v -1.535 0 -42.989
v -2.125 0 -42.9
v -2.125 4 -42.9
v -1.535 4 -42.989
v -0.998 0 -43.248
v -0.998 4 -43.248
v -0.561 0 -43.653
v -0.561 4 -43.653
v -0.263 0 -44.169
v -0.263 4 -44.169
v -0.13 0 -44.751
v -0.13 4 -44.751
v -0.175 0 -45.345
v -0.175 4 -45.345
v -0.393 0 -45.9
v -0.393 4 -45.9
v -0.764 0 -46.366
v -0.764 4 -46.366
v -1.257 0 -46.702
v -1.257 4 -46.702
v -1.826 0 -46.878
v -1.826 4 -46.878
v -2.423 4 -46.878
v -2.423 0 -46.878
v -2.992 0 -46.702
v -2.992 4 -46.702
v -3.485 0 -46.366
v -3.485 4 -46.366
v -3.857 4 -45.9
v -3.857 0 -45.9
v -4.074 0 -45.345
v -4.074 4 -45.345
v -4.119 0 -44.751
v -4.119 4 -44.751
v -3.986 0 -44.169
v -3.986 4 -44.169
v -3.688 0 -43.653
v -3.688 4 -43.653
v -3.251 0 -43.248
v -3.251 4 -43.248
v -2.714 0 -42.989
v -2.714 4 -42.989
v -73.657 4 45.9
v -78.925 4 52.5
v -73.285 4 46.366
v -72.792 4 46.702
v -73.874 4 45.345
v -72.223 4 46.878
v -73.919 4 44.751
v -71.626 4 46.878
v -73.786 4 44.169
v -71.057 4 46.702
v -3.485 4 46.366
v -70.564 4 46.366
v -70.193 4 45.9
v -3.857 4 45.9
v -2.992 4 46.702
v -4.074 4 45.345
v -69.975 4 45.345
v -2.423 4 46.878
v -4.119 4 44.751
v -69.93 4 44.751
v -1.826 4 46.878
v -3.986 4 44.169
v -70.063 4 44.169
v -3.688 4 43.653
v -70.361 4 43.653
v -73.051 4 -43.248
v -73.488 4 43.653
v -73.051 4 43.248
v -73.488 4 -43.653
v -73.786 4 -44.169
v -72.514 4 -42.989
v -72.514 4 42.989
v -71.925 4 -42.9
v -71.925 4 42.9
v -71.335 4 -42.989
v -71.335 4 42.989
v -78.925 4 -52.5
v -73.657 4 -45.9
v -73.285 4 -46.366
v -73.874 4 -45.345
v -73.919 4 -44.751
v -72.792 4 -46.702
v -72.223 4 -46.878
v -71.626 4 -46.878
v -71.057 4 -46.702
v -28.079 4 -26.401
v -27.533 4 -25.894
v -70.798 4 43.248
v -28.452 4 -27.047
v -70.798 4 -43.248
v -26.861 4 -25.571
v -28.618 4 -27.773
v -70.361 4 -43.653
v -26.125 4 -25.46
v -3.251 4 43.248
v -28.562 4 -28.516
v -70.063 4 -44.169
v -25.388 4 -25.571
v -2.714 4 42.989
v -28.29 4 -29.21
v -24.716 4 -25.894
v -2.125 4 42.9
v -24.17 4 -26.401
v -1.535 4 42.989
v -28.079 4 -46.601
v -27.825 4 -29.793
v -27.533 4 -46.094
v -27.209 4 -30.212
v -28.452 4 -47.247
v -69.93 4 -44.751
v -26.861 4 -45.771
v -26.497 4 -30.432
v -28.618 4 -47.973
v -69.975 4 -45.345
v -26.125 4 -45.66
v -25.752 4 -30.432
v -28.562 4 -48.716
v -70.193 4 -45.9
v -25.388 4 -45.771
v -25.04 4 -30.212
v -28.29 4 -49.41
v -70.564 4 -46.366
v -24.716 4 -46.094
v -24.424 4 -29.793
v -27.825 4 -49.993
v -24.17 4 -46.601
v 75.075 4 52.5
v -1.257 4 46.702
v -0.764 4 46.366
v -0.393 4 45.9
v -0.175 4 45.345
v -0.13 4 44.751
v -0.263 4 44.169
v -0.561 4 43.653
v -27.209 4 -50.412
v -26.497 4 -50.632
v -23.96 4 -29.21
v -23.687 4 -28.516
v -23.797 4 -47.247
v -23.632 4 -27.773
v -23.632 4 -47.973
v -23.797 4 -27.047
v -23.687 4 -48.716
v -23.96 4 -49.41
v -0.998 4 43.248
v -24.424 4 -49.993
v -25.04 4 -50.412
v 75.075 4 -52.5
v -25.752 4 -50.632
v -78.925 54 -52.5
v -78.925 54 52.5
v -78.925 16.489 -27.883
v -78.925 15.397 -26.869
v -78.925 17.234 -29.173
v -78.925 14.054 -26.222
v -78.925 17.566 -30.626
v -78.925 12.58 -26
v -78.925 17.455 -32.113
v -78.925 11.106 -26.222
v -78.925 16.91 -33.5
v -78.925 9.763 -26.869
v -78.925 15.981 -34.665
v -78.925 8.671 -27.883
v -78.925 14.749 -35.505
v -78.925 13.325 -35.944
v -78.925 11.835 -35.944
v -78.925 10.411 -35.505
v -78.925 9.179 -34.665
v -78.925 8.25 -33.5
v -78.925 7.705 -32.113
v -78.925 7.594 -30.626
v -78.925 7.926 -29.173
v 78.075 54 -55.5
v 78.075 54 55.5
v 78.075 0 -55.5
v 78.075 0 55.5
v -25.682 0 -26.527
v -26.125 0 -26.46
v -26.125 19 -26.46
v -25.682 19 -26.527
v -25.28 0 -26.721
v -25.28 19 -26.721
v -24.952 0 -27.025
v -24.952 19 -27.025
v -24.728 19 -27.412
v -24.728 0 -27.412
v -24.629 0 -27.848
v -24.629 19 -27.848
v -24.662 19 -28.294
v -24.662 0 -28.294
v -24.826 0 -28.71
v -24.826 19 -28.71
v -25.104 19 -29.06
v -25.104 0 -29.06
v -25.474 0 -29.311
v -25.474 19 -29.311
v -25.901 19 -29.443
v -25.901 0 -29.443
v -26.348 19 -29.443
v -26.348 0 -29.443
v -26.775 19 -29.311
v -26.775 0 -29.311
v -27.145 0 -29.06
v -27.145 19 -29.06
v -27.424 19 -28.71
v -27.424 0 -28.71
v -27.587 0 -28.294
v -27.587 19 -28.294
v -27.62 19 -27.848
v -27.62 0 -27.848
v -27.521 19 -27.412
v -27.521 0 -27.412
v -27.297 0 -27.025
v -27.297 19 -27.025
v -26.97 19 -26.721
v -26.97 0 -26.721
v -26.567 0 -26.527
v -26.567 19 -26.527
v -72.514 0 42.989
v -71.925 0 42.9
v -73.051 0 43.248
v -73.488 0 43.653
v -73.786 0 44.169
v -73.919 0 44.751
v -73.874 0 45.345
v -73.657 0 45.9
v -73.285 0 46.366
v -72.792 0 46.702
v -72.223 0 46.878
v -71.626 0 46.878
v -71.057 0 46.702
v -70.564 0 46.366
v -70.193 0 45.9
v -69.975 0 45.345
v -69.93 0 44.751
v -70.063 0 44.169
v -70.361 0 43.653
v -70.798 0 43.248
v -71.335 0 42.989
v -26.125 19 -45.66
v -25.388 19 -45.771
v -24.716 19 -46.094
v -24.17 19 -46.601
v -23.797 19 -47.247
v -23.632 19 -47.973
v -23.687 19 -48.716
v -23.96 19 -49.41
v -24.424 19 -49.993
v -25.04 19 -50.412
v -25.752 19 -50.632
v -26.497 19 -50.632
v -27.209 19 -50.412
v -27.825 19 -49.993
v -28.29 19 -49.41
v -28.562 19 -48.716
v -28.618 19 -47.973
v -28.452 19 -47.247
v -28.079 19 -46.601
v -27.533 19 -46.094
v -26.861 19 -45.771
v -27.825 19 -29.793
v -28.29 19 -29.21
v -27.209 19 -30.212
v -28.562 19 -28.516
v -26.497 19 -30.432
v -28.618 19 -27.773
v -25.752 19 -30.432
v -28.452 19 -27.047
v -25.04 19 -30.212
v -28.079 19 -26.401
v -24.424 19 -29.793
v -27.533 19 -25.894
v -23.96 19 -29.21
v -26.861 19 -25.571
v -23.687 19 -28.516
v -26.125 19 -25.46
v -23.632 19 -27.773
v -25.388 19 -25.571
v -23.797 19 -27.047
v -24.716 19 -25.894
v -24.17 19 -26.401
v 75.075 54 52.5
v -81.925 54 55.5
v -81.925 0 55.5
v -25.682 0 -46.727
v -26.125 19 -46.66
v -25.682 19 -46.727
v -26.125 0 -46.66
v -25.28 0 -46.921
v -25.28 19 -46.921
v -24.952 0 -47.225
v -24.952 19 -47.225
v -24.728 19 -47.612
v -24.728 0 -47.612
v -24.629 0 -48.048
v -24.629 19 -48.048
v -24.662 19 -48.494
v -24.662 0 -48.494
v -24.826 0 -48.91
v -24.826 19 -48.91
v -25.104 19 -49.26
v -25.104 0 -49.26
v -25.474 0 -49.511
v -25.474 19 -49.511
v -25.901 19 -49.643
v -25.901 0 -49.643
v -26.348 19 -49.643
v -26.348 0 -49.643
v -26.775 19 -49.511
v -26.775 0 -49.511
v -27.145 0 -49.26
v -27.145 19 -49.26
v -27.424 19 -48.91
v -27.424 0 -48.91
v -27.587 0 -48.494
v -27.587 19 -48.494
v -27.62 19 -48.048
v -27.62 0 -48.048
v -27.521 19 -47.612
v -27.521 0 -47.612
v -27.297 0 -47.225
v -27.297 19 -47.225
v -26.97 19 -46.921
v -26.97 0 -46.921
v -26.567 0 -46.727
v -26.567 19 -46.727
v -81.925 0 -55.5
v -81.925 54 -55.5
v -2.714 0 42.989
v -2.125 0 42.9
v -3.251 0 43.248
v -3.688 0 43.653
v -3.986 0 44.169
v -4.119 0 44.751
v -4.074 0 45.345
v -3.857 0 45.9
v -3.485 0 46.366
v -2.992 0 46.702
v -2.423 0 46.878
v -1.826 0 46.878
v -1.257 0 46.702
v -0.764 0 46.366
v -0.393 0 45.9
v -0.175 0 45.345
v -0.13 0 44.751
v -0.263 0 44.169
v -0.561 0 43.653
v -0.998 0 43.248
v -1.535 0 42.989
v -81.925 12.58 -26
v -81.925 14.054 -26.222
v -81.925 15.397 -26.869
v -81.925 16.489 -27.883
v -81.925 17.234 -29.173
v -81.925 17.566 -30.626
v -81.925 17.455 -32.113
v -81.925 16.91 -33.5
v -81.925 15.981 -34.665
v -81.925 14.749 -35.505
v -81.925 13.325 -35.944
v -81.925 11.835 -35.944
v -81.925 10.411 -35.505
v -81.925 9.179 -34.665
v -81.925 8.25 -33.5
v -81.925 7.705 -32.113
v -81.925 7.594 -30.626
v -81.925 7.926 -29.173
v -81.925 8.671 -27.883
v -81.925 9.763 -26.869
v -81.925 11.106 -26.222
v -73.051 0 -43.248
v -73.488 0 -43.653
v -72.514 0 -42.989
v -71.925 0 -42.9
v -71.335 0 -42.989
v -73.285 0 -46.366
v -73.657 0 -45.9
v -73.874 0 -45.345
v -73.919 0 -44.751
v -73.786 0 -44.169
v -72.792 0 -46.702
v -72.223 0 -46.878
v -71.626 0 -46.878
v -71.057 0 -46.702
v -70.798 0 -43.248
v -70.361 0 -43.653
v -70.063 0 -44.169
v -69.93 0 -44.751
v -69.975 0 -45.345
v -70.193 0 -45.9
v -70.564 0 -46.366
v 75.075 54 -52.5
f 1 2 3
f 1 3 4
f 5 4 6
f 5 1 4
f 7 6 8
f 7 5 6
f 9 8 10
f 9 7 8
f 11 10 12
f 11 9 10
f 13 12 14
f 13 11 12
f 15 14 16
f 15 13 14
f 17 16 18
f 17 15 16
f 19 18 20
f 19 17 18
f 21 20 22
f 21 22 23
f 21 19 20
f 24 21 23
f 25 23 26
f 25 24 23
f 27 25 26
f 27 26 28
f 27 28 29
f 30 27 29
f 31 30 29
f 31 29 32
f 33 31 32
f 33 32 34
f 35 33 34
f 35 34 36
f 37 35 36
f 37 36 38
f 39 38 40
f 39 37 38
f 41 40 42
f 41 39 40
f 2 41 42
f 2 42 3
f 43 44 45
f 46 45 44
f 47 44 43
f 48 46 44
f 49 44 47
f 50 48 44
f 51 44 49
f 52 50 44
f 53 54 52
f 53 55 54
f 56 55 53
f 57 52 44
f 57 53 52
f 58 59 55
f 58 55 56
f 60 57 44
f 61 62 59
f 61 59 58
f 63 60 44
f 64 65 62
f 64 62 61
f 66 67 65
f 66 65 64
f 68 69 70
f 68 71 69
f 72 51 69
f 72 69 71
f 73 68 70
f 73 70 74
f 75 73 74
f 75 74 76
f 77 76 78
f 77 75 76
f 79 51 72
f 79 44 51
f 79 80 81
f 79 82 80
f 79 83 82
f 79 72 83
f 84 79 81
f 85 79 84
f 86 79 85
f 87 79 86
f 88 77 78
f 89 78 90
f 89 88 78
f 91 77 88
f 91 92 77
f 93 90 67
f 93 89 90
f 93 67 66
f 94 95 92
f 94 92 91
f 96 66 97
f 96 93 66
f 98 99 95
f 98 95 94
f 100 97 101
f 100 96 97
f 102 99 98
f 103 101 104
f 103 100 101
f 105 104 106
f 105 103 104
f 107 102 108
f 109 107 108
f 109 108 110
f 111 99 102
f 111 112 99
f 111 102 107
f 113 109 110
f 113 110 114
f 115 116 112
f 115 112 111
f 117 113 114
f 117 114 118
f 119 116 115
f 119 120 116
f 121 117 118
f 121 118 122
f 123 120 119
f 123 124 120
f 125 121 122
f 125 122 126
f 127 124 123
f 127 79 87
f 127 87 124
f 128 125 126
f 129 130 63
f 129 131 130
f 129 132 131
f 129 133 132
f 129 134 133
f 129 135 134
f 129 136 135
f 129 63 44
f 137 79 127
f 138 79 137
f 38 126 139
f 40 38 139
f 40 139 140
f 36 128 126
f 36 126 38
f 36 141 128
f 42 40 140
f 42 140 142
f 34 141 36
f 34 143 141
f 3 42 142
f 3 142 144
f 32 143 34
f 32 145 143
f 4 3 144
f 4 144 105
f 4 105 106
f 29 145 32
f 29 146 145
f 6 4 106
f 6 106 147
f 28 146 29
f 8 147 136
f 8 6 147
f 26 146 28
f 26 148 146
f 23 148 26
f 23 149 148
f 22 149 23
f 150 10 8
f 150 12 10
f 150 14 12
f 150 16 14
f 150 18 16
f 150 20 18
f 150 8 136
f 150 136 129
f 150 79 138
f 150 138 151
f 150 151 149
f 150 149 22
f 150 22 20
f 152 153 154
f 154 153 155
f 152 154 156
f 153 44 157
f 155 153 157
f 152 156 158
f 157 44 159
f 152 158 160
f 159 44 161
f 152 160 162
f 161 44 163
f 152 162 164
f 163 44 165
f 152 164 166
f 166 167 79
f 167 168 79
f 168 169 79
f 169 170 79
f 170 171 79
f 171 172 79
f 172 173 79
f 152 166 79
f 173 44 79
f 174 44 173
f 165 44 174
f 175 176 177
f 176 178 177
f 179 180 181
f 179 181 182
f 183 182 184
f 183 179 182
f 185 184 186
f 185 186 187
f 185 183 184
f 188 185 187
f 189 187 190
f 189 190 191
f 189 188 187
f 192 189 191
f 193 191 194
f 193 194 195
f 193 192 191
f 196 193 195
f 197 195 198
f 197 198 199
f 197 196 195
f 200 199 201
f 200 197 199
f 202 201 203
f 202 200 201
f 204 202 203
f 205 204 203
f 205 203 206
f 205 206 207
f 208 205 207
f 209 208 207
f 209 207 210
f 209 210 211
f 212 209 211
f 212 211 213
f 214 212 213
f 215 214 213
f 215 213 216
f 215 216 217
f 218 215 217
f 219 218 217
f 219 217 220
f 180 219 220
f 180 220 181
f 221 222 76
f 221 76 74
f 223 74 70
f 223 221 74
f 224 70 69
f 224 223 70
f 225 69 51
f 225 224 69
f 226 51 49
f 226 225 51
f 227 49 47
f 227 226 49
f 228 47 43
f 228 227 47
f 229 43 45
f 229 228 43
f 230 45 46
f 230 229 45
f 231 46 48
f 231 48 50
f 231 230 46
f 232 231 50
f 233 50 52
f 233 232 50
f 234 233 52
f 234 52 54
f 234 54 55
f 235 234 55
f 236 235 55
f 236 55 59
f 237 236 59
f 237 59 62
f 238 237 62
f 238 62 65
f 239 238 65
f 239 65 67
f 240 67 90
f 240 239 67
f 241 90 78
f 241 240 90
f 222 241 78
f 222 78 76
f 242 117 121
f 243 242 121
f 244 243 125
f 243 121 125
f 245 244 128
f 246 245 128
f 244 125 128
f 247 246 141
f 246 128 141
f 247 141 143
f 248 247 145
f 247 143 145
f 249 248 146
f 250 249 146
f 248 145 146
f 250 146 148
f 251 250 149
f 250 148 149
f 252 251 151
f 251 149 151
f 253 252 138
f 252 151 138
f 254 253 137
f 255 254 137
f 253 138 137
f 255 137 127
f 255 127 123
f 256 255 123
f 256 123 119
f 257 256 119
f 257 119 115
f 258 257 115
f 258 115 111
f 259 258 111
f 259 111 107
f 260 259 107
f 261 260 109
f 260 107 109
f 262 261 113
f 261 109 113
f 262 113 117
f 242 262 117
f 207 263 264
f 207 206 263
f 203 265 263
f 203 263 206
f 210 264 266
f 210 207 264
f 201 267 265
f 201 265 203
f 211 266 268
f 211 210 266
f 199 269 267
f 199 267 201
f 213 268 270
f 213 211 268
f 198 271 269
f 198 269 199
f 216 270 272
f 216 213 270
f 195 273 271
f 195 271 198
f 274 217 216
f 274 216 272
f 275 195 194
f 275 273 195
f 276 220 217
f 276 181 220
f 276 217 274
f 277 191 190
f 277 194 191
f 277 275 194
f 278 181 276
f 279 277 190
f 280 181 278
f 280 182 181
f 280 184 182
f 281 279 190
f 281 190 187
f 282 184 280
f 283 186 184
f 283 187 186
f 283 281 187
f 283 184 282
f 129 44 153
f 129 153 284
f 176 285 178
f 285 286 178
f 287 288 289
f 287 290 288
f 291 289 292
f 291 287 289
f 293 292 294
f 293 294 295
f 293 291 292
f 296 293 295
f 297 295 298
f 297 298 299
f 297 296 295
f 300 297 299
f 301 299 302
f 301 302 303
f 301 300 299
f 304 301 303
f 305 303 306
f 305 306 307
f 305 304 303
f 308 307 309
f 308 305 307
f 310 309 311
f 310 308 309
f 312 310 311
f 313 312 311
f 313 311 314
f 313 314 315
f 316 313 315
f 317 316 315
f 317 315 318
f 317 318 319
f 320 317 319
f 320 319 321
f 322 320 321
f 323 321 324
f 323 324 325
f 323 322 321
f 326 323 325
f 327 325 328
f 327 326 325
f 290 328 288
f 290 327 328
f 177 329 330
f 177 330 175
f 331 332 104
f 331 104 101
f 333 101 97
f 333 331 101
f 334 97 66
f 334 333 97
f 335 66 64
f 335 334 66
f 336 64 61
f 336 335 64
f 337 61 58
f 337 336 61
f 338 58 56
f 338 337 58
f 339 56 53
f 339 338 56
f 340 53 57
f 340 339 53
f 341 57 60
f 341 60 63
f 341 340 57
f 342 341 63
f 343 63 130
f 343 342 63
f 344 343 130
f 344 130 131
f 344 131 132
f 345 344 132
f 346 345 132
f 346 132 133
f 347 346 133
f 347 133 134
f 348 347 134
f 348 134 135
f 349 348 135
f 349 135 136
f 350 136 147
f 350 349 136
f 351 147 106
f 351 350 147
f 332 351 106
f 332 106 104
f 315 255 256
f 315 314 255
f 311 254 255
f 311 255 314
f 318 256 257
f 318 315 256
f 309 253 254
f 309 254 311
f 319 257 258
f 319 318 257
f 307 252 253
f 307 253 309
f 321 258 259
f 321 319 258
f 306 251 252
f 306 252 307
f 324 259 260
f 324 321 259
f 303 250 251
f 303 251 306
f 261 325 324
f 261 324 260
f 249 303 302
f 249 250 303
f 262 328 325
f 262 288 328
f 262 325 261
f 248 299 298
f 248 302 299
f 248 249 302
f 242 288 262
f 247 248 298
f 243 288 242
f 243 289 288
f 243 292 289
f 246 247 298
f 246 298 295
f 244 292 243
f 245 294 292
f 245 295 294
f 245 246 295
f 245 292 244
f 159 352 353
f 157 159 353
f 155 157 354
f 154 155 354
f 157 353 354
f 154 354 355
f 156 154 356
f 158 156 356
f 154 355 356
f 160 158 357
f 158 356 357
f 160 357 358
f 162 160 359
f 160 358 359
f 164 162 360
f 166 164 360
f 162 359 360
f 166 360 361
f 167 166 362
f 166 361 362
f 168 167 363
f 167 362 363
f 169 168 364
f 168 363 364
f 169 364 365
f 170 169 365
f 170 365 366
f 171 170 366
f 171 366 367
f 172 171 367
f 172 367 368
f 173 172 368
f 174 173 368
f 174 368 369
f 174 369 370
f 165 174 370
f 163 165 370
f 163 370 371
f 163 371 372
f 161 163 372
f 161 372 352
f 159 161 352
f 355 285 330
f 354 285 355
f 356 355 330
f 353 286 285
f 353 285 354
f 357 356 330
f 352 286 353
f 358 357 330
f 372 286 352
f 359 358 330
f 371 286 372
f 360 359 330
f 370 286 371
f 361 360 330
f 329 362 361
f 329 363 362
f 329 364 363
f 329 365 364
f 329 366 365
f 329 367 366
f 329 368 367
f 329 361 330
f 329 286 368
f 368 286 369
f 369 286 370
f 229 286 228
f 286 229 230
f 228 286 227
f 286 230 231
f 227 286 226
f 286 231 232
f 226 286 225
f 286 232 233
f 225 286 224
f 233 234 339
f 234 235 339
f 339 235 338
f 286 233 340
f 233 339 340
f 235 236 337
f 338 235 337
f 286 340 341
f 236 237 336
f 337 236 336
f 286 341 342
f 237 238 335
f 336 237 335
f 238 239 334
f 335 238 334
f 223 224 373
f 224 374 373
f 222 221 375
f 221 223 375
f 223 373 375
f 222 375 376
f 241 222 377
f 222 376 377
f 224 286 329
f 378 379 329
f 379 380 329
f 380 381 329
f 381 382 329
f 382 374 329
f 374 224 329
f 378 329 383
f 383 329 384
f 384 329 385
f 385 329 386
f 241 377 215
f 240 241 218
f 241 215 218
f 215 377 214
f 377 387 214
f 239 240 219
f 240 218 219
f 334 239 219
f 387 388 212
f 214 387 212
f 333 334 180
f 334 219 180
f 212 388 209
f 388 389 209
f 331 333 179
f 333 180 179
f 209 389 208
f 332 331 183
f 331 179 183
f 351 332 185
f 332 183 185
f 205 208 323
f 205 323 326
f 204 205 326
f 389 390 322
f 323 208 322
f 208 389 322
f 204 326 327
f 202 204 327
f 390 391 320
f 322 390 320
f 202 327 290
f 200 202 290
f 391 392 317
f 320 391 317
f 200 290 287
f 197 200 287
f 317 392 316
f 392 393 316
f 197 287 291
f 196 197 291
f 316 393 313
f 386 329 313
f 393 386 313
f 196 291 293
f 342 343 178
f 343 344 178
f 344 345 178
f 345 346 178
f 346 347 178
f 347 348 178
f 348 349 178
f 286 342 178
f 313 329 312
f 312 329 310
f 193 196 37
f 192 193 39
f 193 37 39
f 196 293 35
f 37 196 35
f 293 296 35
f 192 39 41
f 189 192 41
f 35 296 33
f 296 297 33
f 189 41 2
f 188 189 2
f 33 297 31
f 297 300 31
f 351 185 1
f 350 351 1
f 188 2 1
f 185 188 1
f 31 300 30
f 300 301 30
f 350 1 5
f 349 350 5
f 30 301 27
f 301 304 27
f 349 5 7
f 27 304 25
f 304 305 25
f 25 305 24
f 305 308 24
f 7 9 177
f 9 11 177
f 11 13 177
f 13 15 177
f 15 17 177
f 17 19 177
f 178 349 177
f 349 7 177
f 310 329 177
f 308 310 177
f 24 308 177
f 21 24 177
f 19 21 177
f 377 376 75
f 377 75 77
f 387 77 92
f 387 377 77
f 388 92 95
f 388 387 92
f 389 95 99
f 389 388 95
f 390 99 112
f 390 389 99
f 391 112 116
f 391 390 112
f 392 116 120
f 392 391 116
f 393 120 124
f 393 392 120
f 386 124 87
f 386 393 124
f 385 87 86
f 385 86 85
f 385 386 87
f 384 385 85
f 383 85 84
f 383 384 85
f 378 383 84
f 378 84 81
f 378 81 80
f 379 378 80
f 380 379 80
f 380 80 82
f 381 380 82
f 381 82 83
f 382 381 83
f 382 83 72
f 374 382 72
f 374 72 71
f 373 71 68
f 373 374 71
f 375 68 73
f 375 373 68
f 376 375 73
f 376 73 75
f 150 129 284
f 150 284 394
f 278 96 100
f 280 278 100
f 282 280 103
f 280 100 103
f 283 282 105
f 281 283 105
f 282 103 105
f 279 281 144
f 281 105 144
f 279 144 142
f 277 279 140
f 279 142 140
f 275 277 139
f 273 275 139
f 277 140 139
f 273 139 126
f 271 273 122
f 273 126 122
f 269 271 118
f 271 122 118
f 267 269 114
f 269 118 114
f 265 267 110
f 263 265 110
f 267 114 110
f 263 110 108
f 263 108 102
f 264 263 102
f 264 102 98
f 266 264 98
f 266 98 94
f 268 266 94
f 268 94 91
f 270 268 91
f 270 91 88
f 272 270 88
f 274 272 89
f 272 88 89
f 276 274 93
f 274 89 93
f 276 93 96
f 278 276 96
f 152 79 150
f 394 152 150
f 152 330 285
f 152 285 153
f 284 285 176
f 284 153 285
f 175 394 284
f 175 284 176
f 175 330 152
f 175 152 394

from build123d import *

# Parameters (mm, degrees)
SKETCH_1_W          = 160
SKETCH_1_H          = 111
SKETCH_1_R          = 2
SKETCH_1_R_2        = 1.5
EXTRUDE_1_DEPTH     = 4
SKETCH_2_W          = 160
SKETCH_2_H          = 111
SKETCH_2_W_2        = 154
SKETCH_2_H_2        = 105
EXTRUDE_4_DEPTH     = 50
SKETCH_3_R          = 2.5
SKETCH_3_R_2        = 1.5
EXTRUDE_5_DEPTH     = 15
SKETCH_4_R          = 5
CUT_EXTRUDE_1_DEPTH = 5


with BuildPart() as part:
    # 草图1 → 凸台-拉伸1 (new body)
    with BuildSketch(Plane(origin=(0, 0, 0), x_dir=(1, 0, 0), z_dir=(0, 1, 0))):
        with Locations((-1.924564797, 0)):
            Rectangle(SKETCH_1_W, SKETCH_1_H)
        with Locations(Location((-71.924564797, 44.9, 0), (0, 0, 270))):
            Circle(SKETCH_1_R, mode=Mode.SUBTRACT)
        with Locations(Location((-71.924564797, -44.9, 0), (0, 0, 90))):
            Circle(SKETCH_1_R, mode=Mode.SUBTRACT)
        with Locations(Location((-2.124564797, 44.9, 0), (0, 0, 270))):
            Circle(SKETCH_1_R, mode=Mode.SUBTRACT)
        with Locations(Location((-2.124564797, -44.9, 0), (0, 0, 90))):
            Circle(SKETCH_1_R, mode=Mode.SUBTRACT)
        with Locations(Location((-26.124564797, 48.16, 0), (0, 0, 270))):
            Circle(SKETCH_1_R_2, mode=Mode.SUBTRACT)
        with Locations(Location((-26.124564797, 27.96, 0), (0, 0, 270))):
            Circle(SKETCH_1_R_2, mode=Mode.SUBTRACT)
    extrude(amount=EXTRUDE_1_DEPTH)



with BuildPart() as body_2:
    # 草图2 → 凸台-拉伸4 (new body)
    with BuildSketch(Plane(origin=(0, 4, 0), x_dir=(1, 0, 0), z_dir=(0, 1, 0))):
        with Locations((-1.924564797, 0)):
            Rectangle(SKETCH_2_W, SKETCH_2_H)
        with Locations((-1.924564797, 0)):
            Rectangle(SKETCH_2_W_2, SKETCH_2_H_2, mode=Mode.SUBTRACT)
    extrude(amount=EXTRUDE_4_DEPTH)


with BuildPart() as part_1:
    add(part.part)

    add(body_2.part)  # 凸台-拉伸5 merges body 2
    # 草图3 → 凸台-拉伸5 (add)
    # profile 1 of 2: a face of its own
    with BuildSketch(Plane(origin=(0, 4, 0), x_dir=(1, 0, 0), z_dir=(0, 1, 0))):
        with Locations(Location((-26.124564797, 48.16, 0), (0, 0, 270))):
            Circle(SKETCH_3_R)
        with Locations(Location((-26.124564797, 48.16, 0), (0, 0, 270))):
            Circle(SKETCH_3_R_2, mode=Mode.SUBTRACT)
    # profile 2 of 2: a face of its own
    with BuildSketch(Plane(origin=(0, 4, 0), x_dir=(1, 0, 0), z_dir=(0, 1, 0))):
        with Locations(Location((-26.124564797, 27.96, 0), (0, 0, 270))):
            Circle(SKETCH_3_R)
        with Locations(Location((-26.124564797, 27.96, 0), (0, 0, 270))):
            Circle(SKETCH_3_R_2, mode=Mode.SUBTRACT)
    extrude(amount=EXTRUDE_5_DEPTH)

    # 草图4 → 切除-拉伸1 (cut)
    with BuildSketch(Plane.ZY.offset(81.924564797)):
        with Locations((-31, 12.58)):
            Circle(SKETCH_4_R)
    extrude(amount=-CUT_EXTRUDE_1_DEPTH, mode=Mode.SUBTRACT)


solid = part_1.part
